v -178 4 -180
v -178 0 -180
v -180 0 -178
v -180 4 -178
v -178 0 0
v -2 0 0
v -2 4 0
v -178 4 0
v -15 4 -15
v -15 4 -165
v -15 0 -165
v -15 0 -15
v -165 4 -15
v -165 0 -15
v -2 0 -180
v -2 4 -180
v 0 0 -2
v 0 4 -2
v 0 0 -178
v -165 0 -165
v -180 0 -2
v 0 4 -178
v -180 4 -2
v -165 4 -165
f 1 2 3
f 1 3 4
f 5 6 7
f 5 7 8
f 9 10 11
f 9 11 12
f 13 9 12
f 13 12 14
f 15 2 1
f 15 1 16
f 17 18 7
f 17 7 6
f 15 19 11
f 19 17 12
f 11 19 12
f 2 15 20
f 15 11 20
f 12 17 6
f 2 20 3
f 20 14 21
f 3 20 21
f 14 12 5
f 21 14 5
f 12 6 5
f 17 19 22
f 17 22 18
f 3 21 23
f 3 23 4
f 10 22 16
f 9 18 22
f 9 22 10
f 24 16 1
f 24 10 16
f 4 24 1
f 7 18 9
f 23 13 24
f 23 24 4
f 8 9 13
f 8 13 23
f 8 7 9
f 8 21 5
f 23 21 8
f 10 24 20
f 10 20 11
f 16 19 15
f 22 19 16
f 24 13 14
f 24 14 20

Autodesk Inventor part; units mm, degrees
ref_plane "YZ Plane" through (0, 0, 0) normal (1, 0, 0) x (0, 1, 0)
ref_plane "XZ Plane" through (0, 0, 0) normal (0, 1, 0) x (-1, 0, 0)
ref_plane "XY Plane" through (0, 0, 0) normal (0, 0, 1) x (1, 0, 0)
sketch "Sketch1" plane through (0, 0, 0) normal (0, 1, 0) x (-1, 0, 0)
  line L0 (0, 0) -> (180, 0)
  line L1 (180, 0) -> (180, -180)
  line L2 (180, -180) -> (0, -180)
  line L3 (0, -180) -> (0, 0)
  dimension "d0" = 180
  dimension "d1" = 180
extrude "Extrusion1" add sketch "Sketch1" along normal blind 4
chamfer "Chamfer1" distance 2 angle 45 4 edges at (-180, 2, 0) (-180, 2, -180) (0, 2, -180) (0, 2, 0)
sketch "Sketch5" plane through (0, 4, 0) normal (0, 1, 0) x (1, 0, 0)
  line L0 (-165, 165) -> (-15, 165)
  line L1 (-15, 165) -> (-15, 15)
  line L2 (-15, 15) -> (-165, 15)
  line L3 (-165, 15) -> (-165, 165)
  point P0 (0, 0)
  dimension "d29" = 150
  dimension "d30" = 150
  dimension "d31" = 15
  dimension "d32" = 15
extrude "Extrusion5" cut sketch "Sketch5" against normal through all
properties part number "MouldBase20"
